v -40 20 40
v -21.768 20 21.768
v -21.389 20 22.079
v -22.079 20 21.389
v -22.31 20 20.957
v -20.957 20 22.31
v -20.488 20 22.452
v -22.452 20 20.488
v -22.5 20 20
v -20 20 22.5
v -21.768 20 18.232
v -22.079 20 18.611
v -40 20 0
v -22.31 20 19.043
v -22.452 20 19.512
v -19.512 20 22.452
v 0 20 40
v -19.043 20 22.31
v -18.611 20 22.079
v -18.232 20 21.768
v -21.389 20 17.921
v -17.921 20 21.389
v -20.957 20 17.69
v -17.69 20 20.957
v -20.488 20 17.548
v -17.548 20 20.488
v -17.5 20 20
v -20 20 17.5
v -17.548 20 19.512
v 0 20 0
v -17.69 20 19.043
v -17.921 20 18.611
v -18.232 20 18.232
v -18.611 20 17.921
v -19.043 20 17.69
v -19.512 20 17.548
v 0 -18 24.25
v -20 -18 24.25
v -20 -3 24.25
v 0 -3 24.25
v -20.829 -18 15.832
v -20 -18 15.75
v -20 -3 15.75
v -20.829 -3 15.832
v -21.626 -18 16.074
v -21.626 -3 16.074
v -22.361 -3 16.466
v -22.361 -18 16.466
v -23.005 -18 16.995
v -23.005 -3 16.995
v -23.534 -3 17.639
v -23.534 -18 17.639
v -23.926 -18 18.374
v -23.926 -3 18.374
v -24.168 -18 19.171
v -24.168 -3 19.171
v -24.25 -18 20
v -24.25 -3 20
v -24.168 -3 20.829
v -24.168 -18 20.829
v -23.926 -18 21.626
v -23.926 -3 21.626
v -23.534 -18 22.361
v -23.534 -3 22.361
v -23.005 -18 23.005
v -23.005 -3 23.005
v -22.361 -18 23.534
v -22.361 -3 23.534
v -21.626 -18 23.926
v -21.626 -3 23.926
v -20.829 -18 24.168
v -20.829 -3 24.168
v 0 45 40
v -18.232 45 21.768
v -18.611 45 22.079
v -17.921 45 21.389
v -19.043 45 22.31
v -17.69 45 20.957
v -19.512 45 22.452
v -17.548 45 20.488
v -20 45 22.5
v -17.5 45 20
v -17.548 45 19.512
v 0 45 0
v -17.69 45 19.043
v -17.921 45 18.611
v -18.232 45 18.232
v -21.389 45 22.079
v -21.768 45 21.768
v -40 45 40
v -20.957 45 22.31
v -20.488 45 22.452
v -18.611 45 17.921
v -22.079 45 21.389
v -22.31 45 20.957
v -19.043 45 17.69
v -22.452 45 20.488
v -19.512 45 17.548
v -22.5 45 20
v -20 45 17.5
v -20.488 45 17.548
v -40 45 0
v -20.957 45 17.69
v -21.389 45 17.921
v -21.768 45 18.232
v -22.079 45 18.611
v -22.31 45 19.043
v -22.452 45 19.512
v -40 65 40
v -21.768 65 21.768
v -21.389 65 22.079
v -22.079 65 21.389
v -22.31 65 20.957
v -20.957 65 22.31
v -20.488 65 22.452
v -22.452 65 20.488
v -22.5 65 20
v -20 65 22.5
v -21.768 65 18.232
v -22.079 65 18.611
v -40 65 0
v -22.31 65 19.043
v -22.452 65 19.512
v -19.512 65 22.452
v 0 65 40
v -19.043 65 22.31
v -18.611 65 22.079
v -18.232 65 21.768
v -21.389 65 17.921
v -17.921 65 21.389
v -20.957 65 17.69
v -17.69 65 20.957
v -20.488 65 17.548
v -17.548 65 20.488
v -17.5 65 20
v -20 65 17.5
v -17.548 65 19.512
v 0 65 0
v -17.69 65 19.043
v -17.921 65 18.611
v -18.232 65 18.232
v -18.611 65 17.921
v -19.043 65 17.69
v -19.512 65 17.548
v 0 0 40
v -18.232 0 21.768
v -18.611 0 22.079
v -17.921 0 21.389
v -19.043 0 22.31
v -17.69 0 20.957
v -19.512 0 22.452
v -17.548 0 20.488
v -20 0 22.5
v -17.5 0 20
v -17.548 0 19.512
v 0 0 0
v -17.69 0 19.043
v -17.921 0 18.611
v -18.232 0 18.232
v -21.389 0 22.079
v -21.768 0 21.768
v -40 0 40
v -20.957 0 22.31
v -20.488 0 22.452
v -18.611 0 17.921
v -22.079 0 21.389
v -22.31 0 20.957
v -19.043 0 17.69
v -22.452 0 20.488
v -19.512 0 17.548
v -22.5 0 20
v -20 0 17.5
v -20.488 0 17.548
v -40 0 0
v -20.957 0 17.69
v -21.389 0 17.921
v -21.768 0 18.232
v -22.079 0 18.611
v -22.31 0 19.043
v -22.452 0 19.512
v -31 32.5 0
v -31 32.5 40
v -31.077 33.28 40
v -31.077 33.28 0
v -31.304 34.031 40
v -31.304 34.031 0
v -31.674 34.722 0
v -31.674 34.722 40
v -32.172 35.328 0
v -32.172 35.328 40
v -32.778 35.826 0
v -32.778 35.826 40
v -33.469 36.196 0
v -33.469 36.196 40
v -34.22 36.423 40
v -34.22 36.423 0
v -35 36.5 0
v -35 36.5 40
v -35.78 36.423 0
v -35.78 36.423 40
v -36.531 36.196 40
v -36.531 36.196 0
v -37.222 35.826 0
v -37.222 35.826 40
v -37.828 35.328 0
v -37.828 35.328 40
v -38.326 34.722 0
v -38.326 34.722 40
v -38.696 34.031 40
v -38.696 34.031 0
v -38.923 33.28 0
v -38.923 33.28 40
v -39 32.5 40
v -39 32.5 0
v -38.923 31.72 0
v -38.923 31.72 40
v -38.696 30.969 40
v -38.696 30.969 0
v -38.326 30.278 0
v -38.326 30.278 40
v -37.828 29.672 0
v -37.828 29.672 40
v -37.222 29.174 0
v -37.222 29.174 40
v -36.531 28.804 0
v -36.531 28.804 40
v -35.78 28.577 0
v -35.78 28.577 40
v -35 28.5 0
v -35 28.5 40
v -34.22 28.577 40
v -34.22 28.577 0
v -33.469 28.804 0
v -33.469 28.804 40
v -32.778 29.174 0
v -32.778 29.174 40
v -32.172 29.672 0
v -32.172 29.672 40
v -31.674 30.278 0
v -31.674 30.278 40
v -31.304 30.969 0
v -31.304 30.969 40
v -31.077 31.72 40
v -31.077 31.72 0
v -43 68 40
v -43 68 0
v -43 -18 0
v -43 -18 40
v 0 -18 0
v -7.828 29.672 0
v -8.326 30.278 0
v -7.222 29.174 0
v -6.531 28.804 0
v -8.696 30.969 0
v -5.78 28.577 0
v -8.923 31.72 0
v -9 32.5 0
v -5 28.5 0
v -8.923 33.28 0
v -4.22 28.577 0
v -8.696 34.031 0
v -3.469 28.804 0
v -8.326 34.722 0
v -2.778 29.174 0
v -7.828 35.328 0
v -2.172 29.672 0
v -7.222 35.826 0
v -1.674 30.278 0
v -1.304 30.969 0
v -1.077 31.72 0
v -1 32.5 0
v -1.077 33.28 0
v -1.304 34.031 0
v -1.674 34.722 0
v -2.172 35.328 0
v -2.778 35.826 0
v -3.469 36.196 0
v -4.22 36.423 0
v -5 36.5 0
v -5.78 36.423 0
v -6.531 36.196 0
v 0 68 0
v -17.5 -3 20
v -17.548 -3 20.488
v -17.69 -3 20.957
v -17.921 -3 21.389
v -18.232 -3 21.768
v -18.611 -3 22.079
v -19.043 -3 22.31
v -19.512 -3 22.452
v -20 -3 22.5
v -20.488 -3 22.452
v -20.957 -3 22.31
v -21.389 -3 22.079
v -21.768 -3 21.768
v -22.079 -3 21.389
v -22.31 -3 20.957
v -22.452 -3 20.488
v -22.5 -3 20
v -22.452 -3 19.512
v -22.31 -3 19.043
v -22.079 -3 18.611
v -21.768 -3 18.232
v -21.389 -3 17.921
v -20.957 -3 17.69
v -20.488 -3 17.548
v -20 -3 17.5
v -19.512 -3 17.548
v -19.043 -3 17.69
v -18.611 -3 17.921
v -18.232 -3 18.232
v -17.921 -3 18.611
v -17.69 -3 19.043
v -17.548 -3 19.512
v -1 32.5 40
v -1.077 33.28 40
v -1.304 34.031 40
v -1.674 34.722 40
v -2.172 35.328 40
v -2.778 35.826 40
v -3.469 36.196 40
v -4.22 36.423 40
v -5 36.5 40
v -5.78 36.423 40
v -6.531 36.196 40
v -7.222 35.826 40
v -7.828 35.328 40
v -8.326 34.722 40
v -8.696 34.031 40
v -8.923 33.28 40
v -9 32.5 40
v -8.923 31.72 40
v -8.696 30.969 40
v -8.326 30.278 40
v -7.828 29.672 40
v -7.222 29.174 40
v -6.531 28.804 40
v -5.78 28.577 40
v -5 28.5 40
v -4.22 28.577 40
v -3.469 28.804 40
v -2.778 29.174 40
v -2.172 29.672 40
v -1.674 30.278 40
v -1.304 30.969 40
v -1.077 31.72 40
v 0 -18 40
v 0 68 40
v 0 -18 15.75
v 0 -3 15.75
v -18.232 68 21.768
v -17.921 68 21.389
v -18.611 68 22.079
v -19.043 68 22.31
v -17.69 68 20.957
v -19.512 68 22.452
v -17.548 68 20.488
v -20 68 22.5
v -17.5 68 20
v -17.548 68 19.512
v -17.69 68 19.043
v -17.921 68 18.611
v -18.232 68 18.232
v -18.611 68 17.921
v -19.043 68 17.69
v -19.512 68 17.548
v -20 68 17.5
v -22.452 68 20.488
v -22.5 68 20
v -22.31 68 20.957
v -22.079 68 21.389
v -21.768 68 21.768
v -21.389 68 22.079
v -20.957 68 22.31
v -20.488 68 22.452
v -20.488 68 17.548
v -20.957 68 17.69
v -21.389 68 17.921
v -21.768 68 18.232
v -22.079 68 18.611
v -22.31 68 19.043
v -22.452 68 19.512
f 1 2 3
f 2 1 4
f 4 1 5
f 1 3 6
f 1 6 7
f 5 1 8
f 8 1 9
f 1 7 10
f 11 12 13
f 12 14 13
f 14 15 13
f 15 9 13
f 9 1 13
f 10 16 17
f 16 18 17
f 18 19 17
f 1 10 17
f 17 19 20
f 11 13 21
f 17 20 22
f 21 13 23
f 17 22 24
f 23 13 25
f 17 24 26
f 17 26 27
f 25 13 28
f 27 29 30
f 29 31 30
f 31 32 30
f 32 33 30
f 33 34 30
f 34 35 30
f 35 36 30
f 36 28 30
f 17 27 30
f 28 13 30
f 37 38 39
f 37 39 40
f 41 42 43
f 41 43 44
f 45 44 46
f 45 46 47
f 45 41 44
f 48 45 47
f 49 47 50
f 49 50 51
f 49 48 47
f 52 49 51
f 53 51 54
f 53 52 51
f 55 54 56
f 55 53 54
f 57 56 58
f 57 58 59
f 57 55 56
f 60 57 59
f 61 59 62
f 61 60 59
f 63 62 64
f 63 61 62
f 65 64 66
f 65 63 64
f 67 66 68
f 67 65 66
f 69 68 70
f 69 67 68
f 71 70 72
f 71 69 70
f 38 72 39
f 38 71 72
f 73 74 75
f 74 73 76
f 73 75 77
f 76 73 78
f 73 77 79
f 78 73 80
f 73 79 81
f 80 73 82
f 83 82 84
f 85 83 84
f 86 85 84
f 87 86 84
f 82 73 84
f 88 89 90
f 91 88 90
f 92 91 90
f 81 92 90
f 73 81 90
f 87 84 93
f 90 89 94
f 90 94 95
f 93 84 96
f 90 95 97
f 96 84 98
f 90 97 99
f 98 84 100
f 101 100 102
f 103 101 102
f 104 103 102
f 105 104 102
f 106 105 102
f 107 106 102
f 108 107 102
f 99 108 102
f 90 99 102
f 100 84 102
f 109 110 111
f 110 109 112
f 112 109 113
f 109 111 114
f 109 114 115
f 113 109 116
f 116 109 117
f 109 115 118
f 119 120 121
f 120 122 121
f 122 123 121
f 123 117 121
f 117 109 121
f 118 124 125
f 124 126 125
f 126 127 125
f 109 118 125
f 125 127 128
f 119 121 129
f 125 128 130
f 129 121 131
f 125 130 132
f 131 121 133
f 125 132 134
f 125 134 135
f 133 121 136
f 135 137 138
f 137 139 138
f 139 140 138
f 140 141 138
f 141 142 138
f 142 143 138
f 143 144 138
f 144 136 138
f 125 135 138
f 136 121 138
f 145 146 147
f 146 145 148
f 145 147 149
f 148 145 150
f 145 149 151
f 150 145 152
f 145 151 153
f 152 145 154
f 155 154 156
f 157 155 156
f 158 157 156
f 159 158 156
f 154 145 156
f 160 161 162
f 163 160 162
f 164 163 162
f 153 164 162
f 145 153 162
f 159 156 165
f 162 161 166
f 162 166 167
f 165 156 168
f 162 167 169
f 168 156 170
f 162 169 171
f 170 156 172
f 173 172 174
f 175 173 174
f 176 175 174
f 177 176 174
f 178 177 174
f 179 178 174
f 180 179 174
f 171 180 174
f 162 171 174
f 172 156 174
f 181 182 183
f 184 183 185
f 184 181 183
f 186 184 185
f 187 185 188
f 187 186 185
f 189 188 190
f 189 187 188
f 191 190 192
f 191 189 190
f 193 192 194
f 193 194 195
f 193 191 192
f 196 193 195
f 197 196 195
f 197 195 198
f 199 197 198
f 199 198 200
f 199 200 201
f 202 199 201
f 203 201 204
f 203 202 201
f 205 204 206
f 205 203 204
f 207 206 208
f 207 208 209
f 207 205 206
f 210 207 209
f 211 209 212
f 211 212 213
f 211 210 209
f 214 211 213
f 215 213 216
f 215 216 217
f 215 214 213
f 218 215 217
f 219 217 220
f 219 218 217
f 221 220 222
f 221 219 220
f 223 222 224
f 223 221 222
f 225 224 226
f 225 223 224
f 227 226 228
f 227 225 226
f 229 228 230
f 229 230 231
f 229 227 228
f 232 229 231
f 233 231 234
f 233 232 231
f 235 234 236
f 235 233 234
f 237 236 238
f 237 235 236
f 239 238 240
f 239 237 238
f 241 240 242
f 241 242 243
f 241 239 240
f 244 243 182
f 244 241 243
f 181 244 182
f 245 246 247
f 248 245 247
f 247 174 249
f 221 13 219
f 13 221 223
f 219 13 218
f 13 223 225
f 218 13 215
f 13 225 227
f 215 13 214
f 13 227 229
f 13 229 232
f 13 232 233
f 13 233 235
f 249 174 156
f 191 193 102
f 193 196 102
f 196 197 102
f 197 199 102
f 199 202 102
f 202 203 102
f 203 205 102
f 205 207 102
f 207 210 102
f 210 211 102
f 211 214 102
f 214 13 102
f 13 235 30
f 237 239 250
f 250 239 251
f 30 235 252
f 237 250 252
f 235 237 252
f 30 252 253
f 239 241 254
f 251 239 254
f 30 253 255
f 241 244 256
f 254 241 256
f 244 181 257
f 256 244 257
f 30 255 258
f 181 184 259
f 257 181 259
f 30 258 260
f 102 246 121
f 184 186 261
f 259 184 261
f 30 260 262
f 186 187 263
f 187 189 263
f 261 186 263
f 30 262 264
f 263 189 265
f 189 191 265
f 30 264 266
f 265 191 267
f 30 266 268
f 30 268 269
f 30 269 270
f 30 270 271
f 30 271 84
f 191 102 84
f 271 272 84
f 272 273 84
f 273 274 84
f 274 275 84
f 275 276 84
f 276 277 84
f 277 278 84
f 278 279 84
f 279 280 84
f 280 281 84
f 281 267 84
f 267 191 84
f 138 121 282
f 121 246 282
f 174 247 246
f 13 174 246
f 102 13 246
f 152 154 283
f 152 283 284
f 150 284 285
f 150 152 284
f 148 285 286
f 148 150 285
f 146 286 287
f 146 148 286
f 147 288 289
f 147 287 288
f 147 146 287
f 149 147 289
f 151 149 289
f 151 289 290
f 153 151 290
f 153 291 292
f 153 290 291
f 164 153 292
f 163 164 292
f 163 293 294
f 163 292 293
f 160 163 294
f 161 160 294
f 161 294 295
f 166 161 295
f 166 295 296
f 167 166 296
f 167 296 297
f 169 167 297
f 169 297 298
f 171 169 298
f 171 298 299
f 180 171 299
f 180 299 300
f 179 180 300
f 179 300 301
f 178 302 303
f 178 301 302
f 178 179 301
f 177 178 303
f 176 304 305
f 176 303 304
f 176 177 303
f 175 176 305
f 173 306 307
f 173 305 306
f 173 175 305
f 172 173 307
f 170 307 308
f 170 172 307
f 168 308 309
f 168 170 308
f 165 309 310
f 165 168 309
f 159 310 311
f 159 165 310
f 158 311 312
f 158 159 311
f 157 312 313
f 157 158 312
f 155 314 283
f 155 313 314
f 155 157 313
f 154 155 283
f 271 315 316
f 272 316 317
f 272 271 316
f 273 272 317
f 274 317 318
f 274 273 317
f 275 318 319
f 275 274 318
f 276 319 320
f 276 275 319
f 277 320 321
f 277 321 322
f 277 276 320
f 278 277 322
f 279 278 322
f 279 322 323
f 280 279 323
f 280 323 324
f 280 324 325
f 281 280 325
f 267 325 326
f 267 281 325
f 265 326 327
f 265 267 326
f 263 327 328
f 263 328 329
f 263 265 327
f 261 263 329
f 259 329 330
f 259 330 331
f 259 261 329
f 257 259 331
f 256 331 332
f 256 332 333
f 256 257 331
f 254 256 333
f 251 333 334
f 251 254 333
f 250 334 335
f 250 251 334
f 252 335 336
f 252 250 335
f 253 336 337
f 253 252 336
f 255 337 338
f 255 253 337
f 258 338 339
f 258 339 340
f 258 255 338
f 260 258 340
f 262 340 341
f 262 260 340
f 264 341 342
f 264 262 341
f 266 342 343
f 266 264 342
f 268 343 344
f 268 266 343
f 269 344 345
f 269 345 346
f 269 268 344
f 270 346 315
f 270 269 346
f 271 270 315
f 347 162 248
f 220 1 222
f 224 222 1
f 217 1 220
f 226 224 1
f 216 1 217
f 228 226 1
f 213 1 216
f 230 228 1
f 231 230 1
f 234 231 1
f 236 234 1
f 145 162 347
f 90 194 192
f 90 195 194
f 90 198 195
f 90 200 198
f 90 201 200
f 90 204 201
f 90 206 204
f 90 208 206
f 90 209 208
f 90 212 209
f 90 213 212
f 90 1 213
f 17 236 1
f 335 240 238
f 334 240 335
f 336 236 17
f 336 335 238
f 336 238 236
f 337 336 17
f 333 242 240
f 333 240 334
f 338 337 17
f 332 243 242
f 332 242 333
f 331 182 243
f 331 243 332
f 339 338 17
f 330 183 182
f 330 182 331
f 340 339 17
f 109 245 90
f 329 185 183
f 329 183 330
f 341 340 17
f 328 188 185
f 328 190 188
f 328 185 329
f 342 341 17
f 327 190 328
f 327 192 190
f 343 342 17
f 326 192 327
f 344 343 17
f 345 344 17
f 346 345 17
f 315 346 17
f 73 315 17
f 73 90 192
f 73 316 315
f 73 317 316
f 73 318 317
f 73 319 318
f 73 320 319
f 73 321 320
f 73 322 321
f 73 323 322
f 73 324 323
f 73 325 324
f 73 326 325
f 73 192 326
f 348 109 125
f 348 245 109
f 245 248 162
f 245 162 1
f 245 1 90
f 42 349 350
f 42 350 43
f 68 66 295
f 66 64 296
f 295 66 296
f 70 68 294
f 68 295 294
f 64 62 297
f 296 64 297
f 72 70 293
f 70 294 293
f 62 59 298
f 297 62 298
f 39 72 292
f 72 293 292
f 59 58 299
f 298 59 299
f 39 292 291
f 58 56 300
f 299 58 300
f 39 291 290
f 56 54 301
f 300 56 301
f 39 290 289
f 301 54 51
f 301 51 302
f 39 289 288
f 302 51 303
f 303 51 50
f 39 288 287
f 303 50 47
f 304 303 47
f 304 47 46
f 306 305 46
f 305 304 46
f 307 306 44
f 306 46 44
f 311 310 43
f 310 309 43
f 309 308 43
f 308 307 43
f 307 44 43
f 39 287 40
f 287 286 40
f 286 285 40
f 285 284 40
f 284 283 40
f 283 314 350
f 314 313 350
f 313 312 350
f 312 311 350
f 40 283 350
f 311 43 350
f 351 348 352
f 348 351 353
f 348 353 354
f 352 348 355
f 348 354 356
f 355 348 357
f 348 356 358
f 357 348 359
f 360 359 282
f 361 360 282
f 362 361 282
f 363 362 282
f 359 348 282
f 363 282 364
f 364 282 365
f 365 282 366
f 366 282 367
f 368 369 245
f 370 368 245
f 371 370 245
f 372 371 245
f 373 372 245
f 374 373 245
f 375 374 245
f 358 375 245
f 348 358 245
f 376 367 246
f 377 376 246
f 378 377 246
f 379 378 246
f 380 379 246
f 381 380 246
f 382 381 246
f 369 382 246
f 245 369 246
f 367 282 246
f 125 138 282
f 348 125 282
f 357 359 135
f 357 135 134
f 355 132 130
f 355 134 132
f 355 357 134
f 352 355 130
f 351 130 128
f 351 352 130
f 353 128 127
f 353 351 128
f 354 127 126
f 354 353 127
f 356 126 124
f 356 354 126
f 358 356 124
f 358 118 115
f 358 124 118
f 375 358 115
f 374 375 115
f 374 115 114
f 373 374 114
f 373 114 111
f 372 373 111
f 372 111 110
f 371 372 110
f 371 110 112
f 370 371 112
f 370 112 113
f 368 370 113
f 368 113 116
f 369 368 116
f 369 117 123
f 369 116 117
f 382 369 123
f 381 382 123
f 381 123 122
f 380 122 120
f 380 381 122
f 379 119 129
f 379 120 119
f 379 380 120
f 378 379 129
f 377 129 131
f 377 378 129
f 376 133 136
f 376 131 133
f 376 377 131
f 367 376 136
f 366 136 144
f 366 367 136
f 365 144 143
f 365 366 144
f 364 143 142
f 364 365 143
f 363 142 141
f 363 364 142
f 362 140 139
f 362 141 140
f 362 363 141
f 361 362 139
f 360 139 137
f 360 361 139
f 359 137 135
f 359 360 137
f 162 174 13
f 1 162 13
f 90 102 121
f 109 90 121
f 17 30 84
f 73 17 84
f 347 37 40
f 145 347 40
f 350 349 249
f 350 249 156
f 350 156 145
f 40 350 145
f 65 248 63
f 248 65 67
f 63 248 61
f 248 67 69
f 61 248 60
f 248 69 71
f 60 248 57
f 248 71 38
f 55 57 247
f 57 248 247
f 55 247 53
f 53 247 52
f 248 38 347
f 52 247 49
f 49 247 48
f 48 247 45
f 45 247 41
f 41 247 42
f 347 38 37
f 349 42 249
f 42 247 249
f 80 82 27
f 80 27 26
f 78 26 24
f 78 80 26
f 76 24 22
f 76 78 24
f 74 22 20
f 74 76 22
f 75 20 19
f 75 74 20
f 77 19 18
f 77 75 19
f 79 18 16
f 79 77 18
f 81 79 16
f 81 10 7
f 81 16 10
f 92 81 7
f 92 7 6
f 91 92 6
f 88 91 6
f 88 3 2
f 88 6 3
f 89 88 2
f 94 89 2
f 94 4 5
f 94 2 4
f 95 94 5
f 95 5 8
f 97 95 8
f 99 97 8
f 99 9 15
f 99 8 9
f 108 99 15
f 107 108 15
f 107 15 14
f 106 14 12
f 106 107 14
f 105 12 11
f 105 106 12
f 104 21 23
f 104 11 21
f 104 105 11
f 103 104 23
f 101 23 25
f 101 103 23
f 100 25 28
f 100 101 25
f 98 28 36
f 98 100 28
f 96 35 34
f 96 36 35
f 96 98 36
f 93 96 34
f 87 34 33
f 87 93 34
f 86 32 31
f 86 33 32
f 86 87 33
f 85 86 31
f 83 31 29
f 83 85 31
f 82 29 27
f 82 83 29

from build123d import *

# Parameters (mm, degrees)
SKETCH1_R               = 4
BOSS_EXTRUDE1_DEPTH     = 40
CUT_EXTRUDE1_DEPTH      = 76.848533275
CUT_EXTRUDE1_DEPTH_BACK = 76.848533275
SKETCH3_R               = 2.5
CUT_EXTRUDE2_DEPTH      = 15


with BuildPart() as part:
    # Sketch1 → Boss-Extrude1 (new body)
    with BuildSketch(Plane.XY):
        Polygon((0, 0), (-40, 0), (-40, 20), (0, 20), (0, 45), (-40, 45), (-40, 65), (0, 65), (0, 68), (-43, 68), (-43, 65), (-43, 45), (-43, -18), (0, -18), align=None)
        with Locations((-35, 32.5)):
            Circle(SKETCH1_R, mode=Mode.SUBTRACT)
        with Locations((-5, 32.5)):
            Circle(SKETCH1_R, mode=Mode.SUBTRACT)
    extrude(amount=BOSS_EXTRUDE1_DEPTH)

    # Sketch3 → Cut-Extrude1 (cut, two sides: drawn at the far end of the back side and taken through both)
    with BuildSketch(Plane(origin=(0, 20, 0), x_dir=(-1, 0, 0), z_dir=(0, -1, 0)).offset(-CUT_EXTRUDE1_DEPTH_BACK)):
        with Locations(Location((20, -20, 0), (0, 0, 180))):
            Circle(SKETCH3_R)
    extrude(amount=CUT_EXTRUDE1_DEPTH + CUT_EXTRUDE1_DEPTH_BACK, mode=Mode.SUBTRACT)

    # Sketch4 → Cut-Extrude2 (cut)
    with BuildSketch(Plane(origin=(0, -18, 0), x_dir=(-1, 0, 0), z_dir=(0, -1, 0))):
        with BuildLine():
            Line((20, -24.25), (0, -24.25))
            Line((0, -24.25), (0, -15.75))
            Line((0, -15.75), (20, -15.75))
            ThreePointArc((20, -15.75), (24.25, -20), (20, -24.25))
        make_face()
    extrude(amount=-CUT_EXTRUDE2_DEPTH, mode=Mode.SUBTRACT)


solid = part.part
